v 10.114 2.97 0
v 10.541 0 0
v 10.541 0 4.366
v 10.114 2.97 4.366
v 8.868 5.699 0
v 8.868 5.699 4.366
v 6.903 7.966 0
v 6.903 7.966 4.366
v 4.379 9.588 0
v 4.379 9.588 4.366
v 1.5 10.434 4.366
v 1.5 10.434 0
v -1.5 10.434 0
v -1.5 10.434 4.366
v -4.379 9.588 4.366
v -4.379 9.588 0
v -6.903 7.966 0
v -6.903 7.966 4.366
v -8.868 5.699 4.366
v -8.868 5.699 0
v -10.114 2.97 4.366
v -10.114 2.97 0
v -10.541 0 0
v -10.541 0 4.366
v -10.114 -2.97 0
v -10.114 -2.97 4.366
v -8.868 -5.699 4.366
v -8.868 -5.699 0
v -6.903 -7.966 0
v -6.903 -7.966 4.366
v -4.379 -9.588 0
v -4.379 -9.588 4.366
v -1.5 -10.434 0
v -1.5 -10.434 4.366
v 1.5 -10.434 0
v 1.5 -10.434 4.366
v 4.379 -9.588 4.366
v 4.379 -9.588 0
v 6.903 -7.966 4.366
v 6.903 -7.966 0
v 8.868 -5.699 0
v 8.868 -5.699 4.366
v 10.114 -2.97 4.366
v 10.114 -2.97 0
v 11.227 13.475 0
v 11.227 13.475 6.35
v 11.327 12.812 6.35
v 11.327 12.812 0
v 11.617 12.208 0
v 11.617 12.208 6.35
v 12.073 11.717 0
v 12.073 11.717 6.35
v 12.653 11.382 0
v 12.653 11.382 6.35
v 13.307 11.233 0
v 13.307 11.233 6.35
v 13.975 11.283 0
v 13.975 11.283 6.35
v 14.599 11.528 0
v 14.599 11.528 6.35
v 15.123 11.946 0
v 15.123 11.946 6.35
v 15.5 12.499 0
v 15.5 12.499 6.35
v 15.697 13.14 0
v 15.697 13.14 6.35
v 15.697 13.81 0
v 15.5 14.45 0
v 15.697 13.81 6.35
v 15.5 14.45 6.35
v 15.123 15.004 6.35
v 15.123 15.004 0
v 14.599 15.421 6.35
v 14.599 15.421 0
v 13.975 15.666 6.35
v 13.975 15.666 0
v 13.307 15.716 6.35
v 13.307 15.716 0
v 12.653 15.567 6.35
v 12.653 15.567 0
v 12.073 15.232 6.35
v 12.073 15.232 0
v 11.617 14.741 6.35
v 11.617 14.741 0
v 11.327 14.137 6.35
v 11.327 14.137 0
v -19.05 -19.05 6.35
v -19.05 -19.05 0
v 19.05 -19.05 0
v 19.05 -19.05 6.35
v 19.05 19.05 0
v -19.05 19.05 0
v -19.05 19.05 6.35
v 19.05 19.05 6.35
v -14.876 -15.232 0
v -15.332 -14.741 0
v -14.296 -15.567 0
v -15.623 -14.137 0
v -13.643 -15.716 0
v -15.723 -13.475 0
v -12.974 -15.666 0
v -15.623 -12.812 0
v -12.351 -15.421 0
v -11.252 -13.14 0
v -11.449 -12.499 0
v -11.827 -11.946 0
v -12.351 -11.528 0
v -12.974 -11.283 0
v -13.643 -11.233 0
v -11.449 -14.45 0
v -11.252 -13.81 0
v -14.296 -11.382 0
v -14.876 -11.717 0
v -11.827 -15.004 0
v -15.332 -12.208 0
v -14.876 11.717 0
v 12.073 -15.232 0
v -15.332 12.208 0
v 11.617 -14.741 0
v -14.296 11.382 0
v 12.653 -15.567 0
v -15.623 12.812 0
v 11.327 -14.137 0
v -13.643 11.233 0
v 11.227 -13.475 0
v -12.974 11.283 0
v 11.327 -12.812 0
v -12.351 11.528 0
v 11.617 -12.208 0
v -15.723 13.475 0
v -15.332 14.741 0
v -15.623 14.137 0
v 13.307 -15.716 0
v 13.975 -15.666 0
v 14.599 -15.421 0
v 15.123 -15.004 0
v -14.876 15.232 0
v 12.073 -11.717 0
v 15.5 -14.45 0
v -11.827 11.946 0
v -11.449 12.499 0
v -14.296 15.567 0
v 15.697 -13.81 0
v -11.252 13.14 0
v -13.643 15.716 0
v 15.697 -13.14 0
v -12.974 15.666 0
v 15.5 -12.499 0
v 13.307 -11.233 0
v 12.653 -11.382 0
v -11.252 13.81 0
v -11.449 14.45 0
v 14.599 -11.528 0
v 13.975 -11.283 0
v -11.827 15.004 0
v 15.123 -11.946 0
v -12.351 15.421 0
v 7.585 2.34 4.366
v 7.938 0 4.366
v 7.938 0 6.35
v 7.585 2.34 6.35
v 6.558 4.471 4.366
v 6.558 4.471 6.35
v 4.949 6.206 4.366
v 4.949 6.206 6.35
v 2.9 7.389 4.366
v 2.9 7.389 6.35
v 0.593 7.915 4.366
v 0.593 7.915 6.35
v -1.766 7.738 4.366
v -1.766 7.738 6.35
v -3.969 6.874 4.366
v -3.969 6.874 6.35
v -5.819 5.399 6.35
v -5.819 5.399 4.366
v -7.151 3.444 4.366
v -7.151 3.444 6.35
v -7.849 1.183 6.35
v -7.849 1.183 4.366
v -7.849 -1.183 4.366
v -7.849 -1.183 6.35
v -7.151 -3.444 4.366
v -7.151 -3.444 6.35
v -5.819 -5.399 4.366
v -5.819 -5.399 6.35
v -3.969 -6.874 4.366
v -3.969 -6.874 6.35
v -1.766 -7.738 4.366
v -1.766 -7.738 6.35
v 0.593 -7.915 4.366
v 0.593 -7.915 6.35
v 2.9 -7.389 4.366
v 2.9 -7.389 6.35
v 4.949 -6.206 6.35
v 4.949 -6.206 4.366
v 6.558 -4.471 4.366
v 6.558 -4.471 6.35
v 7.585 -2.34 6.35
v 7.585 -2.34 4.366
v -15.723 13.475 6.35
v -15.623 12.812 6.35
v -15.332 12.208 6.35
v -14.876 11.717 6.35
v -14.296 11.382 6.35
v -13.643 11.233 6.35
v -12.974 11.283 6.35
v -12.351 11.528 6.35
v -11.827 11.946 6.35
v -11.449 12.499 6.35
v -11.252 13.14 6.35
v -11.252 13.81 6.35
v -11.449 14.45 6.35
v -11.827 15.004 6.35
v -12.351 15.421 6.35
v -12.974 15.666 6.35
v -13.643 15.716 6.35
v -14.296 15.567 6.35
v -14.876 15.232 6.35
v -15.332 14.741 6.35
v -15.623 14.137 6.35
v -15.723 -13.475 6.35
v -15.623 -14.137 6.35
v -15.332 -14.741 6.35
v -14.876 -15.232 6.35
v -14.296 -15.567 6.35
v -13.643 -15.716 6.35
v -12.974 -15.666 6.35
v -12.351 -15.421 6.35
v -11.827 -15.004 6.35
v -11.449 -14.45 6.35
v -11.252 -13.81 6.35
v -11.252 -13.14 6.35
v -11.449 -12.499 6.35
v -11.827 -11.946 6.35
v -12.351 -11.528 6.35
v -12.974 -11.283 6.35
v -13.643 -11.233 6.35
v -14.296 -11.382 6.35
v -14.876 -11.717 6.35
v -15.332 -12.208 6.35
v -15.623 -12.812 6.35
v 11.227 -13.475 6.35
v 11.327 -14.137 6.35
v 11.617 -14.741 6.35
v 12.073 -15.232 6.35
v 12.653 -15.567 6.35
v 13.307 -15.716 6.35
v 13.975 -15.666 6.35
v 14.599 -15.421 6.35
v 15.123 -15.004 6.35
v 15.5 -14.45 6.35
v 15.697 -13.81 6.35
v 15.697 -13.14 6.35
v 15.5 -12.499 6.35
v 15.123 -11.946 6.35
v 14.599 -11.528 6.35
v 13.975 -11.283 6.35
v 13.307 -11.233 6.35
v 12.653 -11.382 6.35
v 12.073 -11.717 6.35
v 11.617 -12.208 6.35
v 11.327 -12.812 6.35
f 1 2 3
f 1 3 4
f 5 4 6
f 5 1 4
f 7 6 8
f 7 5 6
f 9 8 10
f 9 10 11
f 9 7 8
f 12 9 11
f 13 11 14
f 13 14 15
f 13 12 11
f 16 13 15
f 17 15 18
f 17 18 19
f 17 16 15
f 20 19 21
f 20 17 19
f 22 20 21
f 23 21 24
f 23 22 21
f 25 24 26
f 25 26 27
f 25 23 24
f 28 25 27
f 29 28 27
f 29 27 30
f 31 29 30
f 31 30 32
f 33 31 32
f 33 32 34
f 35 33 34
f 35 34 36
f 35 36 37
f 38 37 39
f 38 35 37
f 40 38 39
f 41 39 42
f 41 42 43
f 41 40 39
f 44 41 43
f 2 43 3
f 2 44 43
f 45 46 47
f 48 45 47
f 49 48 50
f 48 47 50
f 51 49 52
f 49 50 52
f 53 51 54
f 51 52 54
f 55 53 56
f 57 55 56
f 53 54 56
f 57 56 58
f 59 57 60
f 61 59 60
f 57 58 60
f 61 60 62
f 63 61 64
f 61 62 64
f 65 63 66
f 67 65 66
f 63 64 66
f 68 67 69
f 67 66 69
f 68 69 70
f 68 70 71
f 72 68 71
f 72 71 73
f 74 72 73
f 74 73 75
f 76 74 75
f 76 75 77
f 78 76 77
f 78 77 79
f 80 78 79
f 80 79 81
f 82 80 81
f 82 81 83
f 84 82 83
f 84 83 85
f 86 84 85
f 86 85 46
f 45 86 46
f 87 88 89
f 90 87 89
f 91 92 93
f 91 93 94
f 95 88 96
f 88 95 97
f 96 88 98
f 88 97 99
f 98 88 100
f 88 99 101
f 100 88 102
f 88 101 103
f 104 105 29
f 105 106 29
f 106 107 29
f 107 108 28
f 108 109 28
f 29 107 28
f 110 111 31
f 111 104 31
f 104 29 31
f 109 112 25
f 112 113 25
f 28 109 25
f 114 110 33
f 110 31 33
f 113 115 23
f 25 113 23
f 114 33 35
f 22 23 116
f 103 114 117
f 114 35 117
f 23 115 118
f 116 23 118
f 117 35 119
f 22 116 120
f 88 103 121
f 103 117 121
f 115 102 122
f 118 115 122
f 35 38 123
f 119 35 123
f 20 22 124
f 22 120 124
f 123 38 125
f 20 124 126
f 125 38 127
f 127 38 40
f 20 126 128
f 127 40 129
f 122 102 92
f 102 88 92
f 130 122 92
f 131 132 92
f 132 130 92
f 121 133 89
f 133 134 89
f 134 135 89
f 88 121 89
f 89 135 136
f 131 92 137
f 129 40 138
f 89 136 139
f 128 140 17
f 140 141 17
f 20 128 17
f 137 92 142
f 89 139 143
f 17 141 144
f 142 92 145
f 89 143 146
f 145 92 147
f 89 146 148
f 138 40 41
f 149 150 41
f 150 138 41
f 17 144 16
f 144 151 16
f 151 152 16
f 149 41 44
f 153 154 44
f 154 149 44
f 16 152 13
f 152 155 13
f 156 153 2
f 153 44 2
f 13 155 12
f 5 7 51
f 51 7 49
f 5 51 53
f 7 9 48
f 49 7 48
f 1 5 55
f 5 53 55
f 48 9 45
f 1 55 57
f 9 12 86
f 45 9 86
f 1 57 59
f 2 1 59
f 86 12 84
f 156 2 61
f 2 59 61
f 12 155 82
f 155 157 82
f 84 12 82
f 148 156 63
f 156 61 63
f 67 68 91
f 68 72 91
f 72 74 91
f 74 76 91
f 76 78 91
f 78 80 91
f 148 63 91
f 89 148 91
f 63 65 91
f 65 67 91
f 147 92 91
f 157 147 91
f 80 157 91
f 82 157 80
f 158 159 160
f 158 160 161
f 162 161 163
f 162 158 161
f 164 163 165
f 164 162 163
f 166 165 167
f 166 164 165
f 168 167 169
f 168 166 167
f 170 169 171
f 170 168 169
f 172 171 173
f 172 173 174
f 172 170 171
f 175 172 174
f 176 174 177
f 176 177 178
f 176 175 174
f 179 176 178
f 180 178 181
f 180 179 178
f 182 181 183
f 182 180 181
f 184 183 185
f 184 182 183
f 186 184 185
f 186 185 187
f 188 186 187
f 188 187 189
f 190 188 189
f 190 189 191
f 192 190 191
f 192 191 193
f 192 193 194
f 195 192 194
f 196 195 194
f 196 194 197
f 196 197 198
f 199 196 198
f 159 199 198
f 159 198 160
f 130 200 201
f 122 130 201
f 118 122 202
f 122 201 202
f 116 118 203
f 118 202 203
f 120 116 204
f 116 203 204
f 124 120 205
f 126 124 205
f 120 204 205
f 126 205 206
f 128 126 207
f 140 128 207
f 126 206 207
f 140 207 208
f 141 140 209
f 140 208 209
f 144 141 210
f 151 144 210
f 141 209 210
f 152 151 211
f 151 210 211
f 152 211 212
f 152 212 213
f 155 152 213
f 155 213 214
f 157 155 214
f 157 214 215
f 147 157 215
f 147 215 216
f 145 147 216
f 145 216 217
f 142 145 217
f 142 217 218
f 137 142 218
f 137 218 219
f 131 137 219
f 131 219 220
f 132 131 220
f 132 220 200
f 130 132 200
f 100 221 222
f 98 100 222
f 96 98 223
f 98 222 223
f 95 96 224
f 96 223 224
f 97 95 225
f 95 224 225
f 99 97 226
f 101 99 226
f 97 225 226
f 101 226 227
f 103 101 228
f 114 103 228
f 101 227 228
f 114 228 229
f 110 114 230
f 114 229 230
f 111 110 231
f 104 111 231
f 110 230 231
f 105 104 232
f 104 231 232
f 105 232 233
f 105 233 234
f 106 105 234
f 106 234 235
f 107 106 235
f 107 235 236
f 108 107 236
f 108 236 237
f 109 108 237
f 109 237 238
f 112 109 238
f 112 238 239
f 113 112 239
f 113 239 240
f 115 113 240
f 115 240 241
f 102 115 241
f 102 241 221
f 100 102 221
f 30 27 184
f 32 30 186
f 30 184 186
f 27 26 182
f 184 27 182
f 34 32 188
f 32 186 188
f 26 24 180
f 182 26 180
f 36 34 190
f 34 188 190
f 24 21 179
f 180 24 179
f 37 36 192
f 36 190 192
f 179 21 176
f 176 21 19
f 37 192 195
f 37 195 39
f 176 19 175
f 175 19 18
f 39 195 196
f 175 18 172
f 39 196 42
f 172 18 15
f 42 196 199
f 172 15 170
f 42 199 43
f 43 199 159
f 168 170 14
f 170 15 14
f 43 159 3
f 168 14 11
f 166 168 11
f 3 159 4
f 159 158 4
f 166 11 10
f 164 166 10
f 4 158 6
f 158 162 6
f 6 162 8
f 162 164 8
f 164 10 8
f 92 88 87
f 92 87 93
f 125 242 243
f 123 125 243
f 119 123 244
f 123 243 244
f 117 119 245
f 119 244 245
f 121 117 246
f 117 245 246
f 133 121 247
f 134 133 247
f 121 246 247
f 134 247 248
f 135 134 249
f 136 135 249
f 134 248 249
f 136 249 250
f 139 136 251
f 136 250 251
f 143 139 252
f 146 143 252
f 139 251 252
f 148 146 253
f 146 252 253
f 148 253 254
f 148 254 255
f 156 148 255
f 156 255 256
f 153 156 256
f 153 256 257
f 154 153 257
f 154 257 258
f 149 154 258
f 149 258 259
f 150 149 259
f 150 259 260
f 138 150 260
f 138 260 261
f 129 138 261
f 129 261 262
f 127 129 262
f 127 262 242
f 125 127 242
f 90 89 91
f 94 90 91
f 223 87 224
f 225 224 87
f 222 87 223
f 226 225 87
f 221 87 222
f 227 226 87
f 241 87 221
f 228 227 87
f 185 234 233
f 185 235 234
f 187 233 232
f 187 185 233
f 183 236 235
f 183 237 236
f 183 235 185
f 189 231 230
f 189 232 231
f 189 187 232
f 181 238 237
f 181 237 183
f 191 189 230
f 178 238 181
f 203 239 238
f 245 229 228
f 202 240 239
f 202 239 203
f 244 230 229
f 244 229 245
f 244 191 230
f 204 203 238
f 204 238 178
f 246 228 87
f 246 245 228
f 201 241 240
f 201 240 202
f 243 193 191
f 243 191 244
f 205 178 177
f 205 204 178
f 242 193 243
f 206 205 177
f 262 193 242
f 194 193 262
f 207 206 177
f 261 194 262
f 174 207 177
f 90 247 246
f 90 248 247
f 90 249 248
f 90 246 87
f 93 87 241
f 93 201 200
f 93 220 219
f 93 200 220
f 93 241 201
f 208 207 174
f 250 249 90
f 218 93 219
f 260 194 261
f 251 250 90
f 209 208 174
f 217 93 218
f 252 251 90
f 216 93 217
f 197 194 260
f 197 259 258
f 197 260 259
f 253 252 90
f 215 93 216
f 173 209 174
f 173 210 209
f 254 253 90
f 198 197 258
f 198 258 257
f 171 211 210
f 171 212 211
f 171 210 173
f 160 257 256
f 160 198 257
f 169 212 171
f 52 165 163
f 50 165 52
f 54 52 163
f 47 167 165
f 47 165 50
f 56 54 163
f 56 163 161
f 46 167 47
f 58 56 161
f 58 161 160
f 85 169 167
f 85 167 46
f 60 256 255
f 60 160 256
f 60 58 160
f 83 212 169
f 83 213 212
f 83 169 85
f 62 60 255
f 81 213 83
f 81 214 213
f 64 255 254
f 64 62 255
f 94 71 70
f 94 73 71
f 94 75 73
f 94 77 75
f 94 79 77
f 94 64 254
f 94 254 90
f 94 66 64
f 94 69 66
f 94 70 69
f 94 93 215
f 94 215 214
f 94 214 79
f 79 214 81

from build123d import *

# Parameters (mm, degrees)
F0_W     = 38.1
F0_H     = 38.1
F0_R     = 10.541
F1_DEPTH = 6.35
F0_R_2   = 7.9375
F2_DEPTH = 6.35
F3_D     = 4.4958
F4_D     = 4.4958
F5_D     = 4.4958
F6_D     = 4.4958
F7_DEPTH = 4.365625


with BuildPart() as f1:
    # F0 (on Top) → F1 (new body)
    with BuildSketch(Plane.XY):
        Rectangle(F0_W, F0_H)
        Circle(F0_R, mode=Mode.SUBTRACT)
    extrude(amount=F1_DEPTH)

    # F0 (on Top) → F2 (join)
    with BuildSketch(Plane.XY):
        Rectangle(F0_W, F0_H)
        Circle(F0_R, mode=Mode.SUBTRACT)
        Circle(F0_R)
        Circle(F0_R_2, mode=Mode.SUBTRACT)
    extrude(amount=F2_DEPTH)

    # F3 (through all)
    with Locations(Plane(origin=(0, 0, 0), x_dir=(1, 0, 0), z_dir=(0, 0, -1))):
        with Locations((-13.4747, 13.4747)):
            Hole(F3_D / 2)

    # F4 (through all)
    with Locations(Plane(origin=(0, 0, 0), x_dir=(1, 0, 0), z_dir=(0, 0, -1))):
        with Locations((-13.4747, -13.4747)):
            Hole(F4_D / 2)

    # F5 (through all)
    with Locations(Plane(origin=(0, 0, 0), x_dir=(1, 0, 0), z_dir=(0, 0, -1))):
        with Locations((13.4747, -13.4747)):
            Hole(F5_D / 2)

    # F6 (through all)
    with Locations(Plane(origin=(0, 0, 0), x_dir=(1, 0, 0), z_dir=(0, 0, -1))):
        with Locations((13.4747, 13.4747)):
            Hole(F6_D / 2)

    # F0 (on Top) → F7 (cut)
    with BuildSketch(Plane.XY):
        Circle(F0_R)
        Circle(F0_R_2, mode=Mode.SUBTRACT)
    extrude(amount=F7_DEPTH, mode=Mode.SUBTRACT)


solid = f1.part
